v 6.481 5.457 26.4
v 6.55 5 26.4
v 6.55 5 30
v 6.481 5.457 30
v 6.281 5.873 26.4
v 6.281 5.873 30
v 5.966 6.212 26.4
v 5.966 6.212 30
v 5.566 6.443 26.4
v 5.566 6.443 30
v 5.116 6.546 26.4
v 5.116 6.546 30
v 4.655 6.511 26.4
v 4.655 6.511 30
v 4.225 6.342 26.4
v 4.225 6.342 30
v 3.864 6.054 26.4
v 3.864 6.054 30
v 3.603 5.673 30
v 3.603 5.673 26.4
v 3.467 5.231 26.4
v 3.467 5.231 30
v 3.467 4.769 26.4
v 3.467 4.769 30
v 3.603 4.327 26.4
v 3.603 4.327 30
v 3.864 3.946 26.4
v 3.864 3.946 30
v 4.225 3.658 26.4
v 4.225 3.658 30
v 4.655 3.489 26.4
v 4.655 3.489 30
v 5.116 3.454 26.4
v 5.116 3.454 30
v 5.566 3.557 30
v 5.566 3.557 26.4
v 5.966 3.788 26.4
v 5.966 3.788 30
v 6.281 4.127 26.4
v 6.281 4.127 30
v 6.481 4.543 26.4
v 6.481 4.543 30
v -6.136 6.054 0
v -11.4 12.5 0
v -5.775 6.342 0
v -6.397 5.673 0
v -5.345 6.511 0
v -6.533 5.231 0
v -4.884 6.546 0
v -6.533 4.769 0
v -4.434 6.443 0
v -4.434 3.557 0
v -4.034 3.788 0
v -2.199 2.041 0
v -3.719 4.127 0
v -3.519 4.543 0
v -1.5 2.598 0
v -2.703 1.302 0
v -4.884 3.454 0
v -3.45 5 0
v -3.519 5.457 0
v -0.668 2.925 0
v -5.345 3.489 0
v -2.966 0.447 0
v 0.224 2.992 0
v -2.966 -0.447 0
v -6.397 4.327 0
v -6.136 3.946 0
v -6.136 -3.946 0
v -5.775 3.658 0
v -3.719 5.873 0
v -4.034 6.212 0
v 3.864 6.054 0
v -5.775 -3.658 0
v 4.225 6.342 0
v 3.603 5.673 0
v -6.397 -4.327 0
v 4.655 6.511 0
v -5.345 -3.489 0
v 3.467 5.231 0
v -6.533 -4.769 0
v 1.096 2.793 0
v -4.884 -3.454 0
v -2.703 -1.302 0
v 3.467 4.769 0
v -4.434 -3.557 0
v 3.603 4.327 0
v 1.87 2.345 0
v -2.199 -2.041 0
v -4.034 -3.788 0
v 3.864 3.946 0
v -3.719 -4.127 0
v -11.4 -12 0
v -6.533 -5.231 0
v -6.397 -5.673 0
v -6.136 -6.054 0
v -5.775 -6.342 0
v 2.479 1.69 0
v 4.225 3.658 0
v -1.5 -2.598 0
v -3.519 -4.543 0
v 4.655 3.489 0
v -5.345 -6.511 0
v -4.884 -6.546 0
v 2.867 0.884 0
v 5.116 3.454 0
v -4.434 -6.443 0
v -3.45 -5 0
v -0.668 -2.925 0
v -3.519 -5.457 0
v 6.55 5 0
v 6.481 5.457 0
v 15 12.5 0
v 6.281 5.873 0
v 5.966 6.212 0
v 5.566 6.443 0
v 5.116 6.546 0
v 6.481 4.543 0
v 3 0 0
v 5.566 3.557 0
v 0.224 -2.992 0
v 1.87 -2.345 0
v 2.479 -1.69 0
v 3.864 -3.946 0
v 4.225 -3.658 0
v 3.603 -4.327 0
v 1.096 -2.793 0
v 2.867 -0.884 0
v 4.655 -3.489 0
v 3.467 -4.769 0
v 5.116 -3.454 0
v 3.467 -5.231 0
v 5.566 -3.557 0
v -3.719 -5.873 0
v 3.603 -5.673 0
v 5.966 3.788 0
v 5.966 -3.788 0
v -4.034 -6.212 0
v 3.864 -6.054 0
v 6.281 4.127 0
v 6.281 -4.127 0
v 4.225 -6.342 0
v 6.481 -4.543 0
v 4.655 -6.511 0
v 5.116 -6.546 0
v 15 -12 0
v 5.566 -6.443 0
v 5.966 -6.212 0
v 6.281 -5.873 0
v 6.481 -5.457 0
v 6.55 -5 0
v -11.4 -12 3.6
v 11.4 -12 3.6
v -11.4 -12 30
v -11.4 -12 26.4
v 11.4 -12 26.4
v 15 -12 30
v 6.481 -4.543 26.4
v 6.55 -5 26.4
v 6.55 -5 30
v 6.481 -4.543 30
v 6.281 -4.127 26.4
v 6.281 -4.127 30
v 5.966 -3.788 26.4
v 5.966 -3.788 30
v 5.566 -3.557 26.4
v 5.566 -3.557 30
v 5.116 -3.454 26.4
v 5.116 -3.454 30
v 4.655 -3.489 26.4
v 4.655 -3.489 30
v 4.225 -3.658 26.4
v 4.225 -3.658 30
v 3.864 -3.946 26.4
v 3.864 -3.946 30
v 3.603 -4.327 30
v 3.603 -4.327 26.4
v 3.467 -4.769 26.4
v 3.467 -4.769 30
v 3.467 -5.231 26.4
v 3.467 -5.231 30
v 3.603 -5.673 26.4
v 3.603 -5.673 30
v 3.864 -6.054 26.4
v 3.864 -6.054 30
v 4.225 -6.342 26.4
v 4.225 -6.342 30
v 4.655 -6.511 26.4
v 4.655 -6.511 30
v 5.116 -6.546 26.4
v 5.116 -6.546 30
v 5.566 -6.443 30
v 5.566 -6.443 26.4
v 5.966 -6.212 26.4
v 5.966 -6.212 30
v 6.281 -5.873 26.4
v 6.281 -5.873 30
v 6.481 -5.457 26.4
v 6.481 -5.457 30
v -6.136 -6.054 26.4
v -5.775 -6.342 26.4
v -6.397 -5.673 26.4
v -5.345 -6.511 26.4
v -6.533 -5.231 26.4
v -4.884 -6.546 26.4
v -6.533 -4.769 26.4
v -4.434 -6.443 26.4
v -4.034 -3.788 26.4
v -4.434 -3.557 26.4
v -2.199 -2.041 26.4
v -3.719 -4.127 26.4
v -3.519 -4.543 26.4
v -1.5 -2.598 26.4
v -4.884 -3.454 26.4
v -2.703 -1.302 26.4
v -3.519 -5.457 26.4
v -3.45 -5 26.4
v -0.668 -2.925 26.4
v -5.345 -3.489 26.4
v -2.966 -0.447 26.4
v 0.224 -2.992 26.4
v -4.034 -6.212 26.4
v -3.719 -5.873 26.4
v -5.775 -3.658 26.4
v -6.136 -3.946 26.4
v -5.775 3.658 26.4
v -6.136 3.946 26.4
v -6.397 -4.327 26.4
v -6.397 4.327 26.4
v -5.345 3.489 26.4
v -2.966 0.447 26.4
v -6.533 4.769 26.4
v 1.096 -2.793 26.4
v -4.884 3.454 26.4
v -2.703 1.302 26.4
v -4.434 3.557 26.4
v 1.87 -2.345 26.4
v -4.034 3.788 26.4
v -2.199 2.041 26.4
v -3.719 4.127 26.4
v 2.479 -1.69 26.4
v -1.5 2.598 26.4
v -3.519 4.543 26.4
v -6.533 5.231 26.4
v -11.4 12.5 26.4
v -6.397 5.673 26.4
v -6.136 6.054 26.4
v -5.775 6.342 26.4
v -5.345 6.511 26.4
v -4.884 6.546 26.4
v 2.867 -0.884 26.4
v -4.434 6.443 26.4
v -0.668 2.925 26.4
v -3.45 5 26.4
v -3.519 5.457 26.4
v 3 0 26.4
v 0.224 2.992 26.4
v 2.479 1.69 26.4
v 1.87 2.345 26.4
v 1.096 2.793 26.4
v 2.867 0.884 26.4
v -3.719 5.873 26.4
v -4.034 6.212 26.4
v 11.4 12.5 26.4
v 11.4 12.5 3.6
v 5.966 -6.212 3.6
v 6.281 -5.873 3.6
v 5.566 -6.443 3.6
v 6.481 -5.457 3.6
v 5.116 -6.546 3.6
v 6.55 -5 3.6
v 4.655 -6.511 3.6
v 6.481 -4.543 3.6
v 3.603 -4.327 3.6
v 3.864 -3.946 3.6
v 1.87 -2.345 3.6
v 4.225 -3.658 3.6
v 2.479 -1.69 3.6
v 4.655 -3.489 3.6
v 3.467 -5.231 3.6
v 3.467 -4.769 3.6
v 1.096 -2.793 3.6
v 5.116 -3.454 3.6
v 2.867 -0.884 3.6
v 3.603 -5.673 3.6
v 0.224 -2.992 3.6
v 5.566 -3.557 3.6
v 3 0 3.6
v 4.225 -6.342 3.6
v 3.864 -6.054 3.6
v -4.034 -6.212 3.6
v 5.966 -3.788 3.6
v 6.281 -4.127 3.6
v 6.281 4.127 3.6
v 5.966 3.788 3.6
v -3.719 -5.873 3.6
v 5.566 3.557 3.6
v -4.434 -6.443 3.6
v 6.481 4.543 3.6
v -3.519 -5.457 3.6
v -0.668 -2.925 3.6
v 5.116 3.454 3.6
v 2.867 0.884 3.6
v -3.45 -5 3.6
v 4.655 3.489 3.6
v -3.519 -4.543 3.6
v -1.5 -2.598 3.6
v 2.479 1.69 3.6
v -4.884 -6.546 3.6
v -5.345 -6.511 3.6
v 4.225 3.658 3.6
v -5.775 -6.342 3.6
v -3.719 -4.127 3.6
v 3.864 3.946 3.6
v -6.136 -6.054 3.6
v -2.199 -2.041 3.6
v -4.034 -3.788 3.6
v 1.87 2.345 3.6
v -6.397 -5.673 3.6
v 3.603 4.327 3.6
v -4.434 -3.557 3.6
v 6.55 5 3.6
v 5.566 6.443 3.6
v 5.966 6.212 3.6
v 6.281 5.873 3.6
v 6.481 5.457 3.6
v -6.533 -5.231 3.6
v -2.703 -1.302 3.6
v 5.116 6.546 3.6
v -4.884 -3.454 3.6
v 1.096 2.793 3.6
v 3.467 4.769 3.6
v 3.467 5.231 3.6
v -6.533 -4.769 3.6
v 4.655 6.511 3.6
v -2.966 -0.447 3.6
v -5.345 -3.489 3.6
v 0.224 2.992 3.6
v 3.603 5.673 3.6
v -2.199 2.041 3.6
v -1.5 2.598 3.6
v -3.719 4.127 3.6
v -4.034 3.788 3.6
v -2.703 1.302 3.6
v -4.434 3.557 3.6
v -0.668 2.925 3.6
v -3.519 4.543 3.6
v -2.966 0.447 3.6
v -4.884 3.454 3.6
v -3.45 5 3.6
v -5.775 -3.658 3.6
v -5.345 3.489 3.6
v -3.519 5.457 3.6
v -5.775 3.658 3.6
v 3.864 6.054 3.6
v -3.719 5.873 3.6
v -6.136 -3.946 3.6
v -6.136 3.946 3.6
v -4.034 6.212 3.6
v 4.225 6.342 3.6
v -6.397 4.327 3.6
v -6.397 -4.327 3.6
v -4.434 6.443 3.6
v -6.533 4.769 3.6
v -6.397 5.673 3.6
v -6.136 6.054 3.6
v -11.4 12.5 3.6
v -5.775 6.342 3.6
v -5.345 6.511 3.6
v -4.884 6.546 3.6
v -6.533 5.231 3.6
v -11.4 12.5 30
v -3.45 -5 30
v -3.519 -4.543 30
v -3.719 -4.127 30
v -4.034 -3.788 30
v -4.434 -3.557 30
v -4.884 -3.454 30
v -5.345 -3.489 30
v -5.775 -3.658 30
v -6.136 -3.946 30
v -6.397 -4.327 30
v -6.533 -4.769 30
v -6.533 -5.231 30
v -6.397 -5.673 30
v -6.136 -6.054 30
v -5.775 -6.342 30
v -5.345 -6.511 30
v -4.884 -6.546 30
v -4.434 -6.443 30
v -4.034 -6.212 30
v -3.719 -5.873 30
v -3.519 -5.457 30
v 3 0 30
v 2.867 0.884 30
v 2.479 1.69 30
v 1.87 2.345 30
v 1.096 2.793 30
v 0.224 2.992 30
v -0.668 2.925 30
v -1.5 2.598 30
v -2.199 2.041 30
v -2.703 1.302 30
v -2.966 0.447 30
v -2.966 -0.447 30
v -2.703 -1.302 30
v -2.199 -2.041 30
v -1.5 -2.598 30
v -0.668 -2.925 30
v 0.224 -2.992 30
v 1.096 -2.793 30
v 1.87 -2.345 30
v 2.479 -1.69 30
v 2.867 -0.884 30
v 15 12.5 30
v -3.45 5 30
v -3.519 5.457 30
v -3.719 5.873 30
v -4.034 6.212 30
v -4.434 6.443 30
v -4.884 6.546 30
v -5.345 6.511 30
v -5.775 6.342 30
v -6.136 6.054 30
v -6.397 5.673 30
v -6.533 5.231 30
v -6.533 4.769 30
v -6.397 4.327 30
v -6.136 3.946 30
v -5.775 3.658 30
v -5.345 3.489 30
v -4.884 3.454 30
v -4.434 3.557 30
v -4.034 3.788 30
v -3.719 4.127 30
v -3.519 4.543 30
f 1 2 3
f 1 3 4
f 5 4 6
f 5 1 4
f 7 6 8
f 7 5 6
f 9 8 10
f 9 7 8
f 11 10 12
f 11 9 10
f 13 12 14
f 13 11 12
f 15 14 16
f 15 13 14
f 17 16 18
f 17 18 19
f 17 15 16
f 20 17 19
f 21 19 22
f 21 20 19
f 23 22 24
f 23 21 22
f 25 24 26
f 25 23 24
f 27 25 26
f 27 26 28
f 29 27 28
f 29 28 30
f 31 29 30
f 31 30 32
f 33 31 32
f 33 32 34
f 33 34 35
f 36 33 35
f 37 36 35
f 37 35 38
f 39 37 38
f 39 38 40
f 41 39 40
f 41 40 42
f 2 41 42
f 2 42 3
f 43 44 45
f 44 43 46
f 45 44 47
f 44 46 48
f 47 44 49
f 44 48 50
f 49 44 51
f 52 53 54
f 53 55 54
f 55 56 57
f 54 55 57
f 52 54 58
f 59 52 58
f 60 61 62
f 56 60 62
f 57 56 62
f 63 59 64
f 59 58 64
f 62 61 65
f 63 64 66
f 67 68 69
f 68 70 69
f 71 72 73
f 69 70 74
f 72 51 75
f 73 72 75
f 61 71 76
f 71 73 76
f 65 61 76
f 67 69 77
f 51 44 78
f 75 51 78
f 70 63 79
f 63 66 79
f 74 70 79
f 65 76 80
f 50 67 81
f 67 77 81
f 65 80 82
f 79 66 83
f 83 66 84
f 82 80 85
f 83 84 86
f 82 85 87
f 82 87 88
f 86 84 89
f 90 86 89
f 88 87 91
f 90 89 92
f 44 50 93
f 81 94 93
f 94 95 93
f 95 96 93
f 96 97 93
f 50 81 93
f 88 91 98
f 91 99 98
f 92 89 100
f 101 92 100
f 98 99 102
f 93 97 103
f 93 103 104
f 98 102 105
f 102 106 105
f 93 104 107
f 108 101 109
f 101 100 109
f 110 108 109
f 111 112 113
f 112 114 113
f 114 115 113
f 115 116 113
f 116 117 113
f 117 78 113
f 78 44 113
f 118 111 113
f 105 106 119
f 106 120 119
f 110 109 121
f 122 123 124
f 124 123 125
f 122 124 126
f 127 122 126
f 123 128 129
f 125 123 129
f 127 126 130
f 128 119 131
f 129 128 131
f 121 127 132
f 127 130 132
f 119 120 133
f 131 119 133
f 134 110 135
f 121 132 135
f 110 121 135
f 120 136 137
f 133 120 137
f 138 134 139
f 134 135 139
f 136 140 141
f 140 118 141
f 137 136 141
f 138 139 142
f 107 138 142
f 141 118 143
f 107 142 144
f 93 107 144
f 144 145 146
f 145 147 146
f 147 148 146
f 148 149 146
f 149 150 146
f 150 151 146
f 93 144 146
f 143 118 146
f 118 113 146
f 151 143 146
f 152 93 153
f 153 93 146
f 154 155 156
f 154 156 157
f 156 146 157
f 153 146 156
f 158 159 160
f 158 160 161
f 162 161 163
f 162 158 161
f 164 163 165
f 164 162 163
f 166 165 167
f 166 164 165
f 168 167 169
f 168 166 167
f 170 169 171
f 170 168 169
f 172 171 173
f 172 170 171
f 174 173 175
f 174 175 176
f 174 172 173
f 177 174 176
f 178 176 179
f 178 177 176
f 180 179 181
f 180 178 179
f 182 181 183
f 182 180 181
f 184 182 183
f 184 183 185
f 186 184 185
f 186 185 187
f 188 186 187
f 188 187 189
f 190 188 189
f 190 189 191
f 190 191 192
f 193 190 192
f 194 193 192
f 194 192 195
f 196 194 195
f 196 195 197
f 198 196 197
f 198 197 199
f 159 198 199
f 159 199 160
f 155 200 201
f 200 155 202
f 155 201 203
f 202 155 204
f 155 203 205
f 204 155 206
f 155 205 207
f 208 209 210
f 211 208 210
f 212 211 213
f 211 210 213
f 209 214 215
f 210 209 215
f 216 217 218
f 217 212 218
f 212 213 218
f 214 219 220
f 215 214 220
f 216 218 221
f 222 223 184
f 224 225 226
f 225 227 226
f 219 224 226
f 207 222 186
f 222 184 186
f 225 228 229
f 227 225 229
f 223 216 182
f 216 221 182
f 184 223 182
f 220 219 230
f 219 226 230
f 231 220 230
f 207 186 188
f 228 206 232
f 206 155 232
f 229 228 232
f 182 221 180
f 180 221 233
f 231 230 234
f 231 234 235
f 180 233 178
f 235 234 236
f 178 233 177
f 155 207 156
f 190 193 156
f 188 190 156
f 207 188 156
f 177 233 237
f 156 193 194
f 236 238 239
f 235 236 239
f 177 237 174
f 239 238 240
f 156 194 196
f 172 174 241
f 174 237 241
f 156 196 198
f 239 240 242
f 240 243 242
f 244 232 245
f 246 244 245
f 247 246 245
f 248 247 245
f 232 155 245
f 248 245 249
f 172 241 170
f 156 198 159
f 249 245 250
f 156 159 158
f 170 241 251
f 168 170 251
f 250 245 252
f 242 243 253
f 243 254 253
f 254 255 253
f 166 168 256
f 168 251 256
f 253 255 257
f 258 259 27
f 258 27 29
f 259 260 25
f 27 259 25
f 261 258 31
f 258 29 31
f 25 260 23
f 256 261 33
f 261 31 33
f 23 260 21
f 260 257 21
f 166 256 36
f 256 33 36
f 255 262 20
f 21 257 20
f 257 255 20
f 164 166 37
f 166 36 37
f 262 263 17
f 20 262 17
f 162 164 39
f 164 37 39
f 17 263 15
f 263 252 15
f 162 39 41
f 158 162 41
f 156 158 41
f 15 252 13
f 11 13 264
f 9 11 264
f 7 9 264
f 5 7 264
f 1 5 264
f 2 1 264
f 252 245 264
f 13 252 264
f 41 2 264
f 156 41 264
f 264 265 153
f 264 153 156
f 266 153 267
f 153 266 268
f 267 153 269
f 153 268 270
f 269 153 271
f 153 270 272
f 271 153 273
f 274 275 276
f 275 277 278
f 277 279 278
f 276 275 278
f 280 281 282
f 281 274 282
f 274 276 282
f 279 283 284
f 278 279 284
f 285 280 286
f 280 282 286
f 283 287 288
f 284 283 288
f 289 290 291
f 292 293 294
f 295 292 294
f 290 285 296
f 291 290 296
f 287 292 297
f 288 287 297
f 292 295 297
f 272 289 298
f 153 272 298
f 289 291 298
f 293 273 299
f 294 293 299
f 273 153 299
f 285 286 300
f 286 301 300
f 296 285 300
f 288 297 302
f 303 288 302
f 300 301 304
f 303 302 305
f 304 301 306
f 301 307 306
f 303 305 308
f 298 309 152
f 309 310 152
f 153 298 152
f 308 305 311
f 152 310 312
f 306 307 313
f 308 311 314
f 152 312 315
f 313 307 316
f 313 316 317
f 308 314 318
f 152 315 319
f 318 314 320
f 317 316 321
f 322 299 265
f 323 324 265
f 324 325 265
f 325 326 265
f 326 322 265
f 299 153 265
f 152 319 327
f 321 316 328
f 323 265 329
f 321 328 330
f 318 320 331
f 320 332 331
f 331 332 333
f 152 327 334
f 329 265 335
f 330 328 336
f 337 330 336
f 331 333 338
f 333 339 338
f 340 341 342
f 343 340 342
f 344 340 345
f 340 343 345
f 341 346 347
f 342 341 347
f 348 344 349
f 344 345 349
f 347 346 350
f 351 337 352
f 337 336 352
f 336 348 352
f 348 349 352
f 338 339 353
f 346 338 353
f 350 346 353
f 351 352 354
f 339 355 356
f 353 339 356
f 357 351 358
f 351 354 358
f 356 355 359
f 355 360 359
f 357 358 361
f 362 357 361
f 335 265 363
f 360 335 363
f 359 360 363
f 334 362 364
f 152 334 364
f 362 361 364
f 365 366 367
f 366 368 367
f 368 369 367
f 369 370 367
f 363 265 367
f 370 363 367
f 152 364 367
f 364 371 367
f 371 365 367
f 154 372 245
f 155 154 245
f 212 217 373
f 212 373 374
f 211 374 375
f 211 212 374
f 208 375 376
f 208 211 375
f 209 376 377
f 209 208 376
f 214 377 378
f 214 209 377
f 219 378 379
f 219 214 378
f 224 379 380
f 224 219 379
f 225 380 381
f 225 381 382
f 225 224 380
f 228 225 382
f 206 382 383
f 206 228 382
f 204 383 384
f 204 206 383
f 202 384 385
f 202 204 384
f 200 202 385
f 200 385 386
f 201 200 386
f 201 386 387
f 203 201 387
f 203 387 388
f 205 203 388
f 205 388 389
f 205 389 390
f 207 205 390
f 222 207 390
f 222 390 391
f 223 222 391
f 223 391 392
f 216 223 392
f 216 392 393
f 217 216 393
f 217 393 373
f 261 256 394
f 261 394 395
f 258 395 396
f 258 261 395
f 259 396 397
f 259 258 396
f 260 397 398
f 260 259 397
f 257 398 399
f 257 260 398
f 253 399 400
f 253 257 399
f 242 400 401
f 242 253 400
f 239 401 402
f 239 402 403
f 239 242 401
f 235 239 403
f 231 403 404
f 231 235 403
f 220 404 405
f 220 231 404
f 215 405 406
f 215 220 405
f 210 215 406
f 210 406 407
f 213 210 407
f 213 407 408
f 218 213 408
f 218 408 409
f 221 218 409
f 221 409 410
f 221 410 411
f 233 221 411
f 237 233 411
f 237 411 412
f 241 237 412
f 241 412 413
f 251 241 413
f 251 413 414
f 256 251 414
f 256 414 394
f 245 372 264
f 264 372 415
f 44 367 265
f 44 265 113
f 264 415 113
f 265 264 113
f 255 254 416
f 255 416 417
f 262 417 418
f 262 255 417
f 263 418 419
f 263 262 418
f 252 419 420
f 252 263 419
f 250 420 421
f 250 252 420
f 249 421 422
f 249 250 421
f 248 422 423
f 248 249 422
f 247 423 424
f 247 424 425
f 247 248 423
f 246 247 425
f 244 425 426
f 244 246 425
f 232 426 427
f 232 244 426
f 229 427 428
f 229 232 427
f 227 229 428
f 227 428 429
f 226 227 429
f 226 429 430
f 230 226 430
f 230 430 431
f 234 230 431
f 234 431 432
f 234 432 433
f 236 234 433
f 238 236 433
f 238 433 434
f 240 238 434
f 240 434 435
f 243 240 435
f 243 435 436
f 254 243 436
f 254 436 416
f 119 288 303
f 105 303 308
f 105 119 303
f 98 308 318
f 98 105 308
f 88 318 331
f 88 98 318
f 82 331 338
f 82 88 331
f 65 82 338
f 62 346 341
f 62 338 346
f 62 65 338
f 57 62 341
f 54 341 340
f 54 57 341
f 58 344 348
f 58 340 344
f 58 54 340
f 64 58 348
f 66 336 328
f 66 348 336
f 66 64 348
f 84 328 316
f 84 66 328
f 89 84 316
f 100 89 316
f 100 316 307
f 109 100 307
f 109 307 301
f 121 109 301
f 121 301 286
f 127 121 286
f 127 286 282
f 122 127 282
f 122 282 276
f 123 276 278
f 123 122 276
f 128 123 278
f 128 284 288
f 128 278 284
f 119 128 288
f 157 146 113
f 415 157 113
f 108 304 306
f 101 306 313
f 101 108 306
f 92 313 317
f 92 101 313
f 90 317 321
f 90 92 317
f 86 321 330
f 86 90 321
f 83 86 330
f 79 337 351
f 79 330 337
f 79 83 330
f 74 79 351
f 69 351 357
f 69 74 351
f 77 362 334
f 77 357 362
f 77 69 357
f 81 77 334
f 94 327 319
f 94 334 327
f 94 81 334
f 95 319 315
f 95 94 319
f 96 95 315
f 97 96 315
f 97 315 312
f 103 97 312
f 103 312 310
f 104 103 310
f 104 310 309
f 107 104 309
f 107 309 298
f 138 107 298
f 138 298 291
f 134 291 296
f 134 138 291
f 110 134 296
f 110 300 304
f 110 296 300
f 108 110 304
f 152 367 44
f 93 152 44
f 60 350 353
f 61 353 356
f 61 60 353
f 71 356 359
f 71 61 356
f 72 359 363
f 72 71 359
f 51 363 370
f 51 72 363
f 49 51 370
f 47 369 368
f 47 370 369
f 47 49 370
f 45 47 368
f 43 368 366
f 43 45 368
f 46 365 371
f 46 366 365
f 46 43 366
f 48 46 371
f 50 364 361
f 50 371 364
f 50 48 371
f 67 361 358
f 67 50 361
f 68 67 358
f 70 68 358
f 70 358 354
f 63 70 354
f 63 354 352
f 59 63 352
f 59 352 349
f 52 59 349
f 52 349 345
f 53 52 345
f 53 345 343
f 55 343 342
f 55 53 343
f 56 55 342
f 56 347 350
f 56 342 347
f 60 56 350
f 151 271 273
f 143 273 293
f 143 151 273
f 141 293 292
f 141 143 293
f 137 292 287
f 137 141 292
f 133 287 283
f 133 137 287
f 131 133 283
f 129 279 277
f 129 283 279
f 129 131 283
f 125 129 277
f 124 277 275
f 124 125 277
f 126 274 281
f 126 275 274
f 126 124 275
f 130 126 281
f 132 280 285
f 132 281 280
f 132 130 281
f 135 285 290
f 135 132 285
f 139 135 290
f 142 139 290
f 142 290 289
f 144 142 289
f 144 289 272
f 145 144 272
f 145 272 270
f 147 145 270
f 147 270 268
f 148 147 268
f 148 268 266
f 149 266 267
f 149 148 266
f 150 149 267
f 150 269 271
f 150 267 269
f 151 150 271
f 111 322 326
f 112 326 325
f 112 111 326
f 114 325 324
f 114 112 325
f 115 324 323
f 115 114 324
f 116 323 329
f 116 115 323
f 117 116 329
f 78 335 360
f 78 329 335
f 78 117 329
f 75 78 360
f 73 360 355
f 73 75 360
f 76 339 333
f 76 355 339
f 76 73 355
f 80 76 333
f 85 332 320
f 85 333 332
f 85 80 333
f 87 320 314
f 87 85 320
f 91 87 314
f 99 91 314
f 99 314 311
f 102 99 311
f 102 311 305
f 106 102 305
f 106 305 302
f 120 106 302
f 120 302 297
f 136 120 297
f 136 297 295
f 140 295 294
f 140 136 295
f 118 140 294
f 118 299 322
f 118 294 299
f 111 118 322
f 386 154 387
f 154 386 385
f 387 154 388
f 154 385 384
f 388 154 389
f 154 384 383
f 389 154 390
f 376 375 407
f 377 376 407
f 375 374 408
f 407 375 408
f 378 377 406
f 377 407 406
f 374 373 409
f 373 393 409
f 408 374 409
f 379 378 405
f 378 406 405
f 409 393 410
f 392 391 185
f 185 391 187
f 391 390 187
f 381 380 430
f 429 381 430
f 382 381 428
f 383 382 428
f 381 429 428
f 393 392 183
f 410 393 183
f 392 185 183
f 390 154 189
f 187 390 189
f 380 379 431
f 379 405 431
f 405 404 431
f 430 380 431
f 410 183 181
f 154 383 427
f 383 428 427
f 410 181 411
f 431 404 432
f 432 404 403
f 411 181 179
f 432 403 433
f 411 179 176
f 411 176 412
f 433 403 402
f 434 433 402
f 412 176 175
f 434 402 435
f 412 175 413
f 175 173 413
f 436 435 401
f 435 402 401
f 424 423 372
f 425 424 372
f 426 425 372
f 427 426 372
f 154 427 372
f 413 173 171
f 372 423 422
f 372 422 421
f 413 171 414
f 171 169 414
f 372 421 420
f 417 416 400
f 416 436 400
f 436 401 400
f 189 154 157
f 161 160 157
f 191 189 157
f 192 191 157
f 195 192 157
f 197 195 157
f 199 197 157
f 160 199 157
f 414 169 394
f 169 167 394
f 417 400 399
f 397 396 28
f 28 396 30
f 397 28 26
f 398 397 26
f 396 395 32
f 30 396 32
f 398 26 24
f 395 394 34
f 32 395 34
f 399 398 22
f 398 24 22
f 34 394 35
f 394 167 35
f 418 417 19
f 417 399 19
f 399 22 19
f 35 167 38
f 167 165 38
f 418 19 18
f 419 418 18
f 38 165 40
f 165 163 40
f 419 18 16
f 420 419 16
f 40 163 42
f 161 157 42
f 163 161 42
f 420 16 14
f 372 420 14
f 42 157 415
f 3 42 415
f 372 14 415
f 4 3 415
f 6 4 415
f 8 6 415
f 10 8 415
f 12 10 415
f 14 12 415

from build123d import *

# Parameters (mm, degrees)
SKETCH_1_R          = 3
SKETCH_1_R_2        = 1.55
EXTRUDE_1_DEPTH     = 30
CUT_EXTRUDE_1_DEPTH = 37.5
SKETCH_4_W          = 30
SKETCH_4_H          = 30
CUT_EXTRUDE_3_DEPTH = 12
EXTRUDE_2_DEPTH     = 55
SKETCH_6_R          = 2.3
SKETCH_6_R_2        = 5
SKETCH_6_R_3        = 6
SKETCH_6_R_4        = 4
CUT_EXTRUDE_4_DEPTH = 25.5
FILLET_2_R          = 2
CUT_EXTRUDE_5_DEPTH = 25.5


with BuildPart() as part:
    # 草图1 → 凸台-拉伸1 (new body)
    with BuildSketch(Plane.XY):
        Polygon((15, 0), (15, 12.5), (0, 12.5), (-15, 12.5), (-15, -24), (15, -24), align=None)
        Circle(SKETCH_1_R, mode=Mode.SUBTRACT)
        with Locations((-5, 5)):
            Circle(SKETCH_1_R_2, mode=Mode.SUBTRACT)
        with Locations((-5, -5)):
            Circle(SKETCH_1_R_2, mode=Mode.SUBTRACT)
        with Locations((5, -5)):
            Circle(SKETCH_1_R_2, mode=Mode.SUBTRACT)
        with Locations((5, 5)):
            Circle(SKETCH_1_R_2, mode=Mode.SUBTRACT)
    extrude(amount=EXTRUDE_1_DEPTH)

    # 草图2 → 切除-拉伸1 (cut, through all)
    with BuildSketch(Plane(origin=(0, 12.5, 0), x_dir=(1, 0, 0), z_dir=(0, 1, 0))):
        Polygon((-11.4, -15), (-11.4, -3.6), (0, -3.6), (11.4, -3.6), (11.4, -26.4), (0, -26.4), (-11.4, -26.4), align=None)
    extrude(amount=-CUT_EXTRUDE_1_DEPTH, mode=Mode.SUBTRACT)

    # 草图4 → 切除-拉伸3 (cut)
    with BuildSketch(Plane.XZ.offset(24)):
        with Locations((0, 15)):
            Rectangle(SKETCH_4_W, SKETCH_4_H)
    extrude(amount=-CUT_EXTRUDE_3_DEPTH, mode=Mode.SUBTRACT)

    # 草图5 → 凸台-拉伸2 (add)
    with BuildSketch(Plane.ZY.offset(15)):
        Polygon((30, -12), (30, 11.596689914), (30, 12.5), (0, 12.5), (0, -12), align=None)
    extrude(amount=EXTRUDE_2_DEPTH)

    # 草图6 → 切除-拉伸4 (cut, through all)
    with BuildSketch(Plane(origin=(0, 12.5, 0), x_dir=(1, 0, 0), z_dir=(0, 1, 0))):
        Polygon((-70, -15), (-11.4, 0), (-70, 0), align=None)
        Polygon((-11.4, -30), (-70, -15), (-70, -30), align=None)
        with Locations((-56.4, -15)):
            Circle(SKETCH_6_R)
        with Locations((-33.9, -15)):
            Circle(SKETCH_6_R_2)
        with Locations((-22.125549979, -15)):
            Circle(SKETCH_6_R_3)
        with Locations((-46.110471912, -15)):
            Circle(SKETCH_6_R_4)
    extrude(amount=-CUT_EXTRUDE_4_DEPTH, mode=Mode.SUBTRACT)

    # 圆角2
    fillet_2_edges = [part.edges().sort_by_distance(p)[0] for p in [
        (-70, 0.25, 15),
    ]]
    fillet(fillet_2_edges, radius=FILLET_2_R)

    # 草图7 → 切除-拉伸5 (cut, through all)
    with BuildSketch(Plane(origin=(0, 12.5, 0), x_dir=(1, 0, 0), z_dir=(0, 1, 0))):
        Polygon((-11.4, -3.6), (-11.4, 0), (-66.954884603, 0), (-66.4, -30), (-11.4, -30), align=None)
    extrude(amount=-CUT_EXTRUDE_5_DEPTH, mode=Mode.SUBTRACT)


solid = part.part
